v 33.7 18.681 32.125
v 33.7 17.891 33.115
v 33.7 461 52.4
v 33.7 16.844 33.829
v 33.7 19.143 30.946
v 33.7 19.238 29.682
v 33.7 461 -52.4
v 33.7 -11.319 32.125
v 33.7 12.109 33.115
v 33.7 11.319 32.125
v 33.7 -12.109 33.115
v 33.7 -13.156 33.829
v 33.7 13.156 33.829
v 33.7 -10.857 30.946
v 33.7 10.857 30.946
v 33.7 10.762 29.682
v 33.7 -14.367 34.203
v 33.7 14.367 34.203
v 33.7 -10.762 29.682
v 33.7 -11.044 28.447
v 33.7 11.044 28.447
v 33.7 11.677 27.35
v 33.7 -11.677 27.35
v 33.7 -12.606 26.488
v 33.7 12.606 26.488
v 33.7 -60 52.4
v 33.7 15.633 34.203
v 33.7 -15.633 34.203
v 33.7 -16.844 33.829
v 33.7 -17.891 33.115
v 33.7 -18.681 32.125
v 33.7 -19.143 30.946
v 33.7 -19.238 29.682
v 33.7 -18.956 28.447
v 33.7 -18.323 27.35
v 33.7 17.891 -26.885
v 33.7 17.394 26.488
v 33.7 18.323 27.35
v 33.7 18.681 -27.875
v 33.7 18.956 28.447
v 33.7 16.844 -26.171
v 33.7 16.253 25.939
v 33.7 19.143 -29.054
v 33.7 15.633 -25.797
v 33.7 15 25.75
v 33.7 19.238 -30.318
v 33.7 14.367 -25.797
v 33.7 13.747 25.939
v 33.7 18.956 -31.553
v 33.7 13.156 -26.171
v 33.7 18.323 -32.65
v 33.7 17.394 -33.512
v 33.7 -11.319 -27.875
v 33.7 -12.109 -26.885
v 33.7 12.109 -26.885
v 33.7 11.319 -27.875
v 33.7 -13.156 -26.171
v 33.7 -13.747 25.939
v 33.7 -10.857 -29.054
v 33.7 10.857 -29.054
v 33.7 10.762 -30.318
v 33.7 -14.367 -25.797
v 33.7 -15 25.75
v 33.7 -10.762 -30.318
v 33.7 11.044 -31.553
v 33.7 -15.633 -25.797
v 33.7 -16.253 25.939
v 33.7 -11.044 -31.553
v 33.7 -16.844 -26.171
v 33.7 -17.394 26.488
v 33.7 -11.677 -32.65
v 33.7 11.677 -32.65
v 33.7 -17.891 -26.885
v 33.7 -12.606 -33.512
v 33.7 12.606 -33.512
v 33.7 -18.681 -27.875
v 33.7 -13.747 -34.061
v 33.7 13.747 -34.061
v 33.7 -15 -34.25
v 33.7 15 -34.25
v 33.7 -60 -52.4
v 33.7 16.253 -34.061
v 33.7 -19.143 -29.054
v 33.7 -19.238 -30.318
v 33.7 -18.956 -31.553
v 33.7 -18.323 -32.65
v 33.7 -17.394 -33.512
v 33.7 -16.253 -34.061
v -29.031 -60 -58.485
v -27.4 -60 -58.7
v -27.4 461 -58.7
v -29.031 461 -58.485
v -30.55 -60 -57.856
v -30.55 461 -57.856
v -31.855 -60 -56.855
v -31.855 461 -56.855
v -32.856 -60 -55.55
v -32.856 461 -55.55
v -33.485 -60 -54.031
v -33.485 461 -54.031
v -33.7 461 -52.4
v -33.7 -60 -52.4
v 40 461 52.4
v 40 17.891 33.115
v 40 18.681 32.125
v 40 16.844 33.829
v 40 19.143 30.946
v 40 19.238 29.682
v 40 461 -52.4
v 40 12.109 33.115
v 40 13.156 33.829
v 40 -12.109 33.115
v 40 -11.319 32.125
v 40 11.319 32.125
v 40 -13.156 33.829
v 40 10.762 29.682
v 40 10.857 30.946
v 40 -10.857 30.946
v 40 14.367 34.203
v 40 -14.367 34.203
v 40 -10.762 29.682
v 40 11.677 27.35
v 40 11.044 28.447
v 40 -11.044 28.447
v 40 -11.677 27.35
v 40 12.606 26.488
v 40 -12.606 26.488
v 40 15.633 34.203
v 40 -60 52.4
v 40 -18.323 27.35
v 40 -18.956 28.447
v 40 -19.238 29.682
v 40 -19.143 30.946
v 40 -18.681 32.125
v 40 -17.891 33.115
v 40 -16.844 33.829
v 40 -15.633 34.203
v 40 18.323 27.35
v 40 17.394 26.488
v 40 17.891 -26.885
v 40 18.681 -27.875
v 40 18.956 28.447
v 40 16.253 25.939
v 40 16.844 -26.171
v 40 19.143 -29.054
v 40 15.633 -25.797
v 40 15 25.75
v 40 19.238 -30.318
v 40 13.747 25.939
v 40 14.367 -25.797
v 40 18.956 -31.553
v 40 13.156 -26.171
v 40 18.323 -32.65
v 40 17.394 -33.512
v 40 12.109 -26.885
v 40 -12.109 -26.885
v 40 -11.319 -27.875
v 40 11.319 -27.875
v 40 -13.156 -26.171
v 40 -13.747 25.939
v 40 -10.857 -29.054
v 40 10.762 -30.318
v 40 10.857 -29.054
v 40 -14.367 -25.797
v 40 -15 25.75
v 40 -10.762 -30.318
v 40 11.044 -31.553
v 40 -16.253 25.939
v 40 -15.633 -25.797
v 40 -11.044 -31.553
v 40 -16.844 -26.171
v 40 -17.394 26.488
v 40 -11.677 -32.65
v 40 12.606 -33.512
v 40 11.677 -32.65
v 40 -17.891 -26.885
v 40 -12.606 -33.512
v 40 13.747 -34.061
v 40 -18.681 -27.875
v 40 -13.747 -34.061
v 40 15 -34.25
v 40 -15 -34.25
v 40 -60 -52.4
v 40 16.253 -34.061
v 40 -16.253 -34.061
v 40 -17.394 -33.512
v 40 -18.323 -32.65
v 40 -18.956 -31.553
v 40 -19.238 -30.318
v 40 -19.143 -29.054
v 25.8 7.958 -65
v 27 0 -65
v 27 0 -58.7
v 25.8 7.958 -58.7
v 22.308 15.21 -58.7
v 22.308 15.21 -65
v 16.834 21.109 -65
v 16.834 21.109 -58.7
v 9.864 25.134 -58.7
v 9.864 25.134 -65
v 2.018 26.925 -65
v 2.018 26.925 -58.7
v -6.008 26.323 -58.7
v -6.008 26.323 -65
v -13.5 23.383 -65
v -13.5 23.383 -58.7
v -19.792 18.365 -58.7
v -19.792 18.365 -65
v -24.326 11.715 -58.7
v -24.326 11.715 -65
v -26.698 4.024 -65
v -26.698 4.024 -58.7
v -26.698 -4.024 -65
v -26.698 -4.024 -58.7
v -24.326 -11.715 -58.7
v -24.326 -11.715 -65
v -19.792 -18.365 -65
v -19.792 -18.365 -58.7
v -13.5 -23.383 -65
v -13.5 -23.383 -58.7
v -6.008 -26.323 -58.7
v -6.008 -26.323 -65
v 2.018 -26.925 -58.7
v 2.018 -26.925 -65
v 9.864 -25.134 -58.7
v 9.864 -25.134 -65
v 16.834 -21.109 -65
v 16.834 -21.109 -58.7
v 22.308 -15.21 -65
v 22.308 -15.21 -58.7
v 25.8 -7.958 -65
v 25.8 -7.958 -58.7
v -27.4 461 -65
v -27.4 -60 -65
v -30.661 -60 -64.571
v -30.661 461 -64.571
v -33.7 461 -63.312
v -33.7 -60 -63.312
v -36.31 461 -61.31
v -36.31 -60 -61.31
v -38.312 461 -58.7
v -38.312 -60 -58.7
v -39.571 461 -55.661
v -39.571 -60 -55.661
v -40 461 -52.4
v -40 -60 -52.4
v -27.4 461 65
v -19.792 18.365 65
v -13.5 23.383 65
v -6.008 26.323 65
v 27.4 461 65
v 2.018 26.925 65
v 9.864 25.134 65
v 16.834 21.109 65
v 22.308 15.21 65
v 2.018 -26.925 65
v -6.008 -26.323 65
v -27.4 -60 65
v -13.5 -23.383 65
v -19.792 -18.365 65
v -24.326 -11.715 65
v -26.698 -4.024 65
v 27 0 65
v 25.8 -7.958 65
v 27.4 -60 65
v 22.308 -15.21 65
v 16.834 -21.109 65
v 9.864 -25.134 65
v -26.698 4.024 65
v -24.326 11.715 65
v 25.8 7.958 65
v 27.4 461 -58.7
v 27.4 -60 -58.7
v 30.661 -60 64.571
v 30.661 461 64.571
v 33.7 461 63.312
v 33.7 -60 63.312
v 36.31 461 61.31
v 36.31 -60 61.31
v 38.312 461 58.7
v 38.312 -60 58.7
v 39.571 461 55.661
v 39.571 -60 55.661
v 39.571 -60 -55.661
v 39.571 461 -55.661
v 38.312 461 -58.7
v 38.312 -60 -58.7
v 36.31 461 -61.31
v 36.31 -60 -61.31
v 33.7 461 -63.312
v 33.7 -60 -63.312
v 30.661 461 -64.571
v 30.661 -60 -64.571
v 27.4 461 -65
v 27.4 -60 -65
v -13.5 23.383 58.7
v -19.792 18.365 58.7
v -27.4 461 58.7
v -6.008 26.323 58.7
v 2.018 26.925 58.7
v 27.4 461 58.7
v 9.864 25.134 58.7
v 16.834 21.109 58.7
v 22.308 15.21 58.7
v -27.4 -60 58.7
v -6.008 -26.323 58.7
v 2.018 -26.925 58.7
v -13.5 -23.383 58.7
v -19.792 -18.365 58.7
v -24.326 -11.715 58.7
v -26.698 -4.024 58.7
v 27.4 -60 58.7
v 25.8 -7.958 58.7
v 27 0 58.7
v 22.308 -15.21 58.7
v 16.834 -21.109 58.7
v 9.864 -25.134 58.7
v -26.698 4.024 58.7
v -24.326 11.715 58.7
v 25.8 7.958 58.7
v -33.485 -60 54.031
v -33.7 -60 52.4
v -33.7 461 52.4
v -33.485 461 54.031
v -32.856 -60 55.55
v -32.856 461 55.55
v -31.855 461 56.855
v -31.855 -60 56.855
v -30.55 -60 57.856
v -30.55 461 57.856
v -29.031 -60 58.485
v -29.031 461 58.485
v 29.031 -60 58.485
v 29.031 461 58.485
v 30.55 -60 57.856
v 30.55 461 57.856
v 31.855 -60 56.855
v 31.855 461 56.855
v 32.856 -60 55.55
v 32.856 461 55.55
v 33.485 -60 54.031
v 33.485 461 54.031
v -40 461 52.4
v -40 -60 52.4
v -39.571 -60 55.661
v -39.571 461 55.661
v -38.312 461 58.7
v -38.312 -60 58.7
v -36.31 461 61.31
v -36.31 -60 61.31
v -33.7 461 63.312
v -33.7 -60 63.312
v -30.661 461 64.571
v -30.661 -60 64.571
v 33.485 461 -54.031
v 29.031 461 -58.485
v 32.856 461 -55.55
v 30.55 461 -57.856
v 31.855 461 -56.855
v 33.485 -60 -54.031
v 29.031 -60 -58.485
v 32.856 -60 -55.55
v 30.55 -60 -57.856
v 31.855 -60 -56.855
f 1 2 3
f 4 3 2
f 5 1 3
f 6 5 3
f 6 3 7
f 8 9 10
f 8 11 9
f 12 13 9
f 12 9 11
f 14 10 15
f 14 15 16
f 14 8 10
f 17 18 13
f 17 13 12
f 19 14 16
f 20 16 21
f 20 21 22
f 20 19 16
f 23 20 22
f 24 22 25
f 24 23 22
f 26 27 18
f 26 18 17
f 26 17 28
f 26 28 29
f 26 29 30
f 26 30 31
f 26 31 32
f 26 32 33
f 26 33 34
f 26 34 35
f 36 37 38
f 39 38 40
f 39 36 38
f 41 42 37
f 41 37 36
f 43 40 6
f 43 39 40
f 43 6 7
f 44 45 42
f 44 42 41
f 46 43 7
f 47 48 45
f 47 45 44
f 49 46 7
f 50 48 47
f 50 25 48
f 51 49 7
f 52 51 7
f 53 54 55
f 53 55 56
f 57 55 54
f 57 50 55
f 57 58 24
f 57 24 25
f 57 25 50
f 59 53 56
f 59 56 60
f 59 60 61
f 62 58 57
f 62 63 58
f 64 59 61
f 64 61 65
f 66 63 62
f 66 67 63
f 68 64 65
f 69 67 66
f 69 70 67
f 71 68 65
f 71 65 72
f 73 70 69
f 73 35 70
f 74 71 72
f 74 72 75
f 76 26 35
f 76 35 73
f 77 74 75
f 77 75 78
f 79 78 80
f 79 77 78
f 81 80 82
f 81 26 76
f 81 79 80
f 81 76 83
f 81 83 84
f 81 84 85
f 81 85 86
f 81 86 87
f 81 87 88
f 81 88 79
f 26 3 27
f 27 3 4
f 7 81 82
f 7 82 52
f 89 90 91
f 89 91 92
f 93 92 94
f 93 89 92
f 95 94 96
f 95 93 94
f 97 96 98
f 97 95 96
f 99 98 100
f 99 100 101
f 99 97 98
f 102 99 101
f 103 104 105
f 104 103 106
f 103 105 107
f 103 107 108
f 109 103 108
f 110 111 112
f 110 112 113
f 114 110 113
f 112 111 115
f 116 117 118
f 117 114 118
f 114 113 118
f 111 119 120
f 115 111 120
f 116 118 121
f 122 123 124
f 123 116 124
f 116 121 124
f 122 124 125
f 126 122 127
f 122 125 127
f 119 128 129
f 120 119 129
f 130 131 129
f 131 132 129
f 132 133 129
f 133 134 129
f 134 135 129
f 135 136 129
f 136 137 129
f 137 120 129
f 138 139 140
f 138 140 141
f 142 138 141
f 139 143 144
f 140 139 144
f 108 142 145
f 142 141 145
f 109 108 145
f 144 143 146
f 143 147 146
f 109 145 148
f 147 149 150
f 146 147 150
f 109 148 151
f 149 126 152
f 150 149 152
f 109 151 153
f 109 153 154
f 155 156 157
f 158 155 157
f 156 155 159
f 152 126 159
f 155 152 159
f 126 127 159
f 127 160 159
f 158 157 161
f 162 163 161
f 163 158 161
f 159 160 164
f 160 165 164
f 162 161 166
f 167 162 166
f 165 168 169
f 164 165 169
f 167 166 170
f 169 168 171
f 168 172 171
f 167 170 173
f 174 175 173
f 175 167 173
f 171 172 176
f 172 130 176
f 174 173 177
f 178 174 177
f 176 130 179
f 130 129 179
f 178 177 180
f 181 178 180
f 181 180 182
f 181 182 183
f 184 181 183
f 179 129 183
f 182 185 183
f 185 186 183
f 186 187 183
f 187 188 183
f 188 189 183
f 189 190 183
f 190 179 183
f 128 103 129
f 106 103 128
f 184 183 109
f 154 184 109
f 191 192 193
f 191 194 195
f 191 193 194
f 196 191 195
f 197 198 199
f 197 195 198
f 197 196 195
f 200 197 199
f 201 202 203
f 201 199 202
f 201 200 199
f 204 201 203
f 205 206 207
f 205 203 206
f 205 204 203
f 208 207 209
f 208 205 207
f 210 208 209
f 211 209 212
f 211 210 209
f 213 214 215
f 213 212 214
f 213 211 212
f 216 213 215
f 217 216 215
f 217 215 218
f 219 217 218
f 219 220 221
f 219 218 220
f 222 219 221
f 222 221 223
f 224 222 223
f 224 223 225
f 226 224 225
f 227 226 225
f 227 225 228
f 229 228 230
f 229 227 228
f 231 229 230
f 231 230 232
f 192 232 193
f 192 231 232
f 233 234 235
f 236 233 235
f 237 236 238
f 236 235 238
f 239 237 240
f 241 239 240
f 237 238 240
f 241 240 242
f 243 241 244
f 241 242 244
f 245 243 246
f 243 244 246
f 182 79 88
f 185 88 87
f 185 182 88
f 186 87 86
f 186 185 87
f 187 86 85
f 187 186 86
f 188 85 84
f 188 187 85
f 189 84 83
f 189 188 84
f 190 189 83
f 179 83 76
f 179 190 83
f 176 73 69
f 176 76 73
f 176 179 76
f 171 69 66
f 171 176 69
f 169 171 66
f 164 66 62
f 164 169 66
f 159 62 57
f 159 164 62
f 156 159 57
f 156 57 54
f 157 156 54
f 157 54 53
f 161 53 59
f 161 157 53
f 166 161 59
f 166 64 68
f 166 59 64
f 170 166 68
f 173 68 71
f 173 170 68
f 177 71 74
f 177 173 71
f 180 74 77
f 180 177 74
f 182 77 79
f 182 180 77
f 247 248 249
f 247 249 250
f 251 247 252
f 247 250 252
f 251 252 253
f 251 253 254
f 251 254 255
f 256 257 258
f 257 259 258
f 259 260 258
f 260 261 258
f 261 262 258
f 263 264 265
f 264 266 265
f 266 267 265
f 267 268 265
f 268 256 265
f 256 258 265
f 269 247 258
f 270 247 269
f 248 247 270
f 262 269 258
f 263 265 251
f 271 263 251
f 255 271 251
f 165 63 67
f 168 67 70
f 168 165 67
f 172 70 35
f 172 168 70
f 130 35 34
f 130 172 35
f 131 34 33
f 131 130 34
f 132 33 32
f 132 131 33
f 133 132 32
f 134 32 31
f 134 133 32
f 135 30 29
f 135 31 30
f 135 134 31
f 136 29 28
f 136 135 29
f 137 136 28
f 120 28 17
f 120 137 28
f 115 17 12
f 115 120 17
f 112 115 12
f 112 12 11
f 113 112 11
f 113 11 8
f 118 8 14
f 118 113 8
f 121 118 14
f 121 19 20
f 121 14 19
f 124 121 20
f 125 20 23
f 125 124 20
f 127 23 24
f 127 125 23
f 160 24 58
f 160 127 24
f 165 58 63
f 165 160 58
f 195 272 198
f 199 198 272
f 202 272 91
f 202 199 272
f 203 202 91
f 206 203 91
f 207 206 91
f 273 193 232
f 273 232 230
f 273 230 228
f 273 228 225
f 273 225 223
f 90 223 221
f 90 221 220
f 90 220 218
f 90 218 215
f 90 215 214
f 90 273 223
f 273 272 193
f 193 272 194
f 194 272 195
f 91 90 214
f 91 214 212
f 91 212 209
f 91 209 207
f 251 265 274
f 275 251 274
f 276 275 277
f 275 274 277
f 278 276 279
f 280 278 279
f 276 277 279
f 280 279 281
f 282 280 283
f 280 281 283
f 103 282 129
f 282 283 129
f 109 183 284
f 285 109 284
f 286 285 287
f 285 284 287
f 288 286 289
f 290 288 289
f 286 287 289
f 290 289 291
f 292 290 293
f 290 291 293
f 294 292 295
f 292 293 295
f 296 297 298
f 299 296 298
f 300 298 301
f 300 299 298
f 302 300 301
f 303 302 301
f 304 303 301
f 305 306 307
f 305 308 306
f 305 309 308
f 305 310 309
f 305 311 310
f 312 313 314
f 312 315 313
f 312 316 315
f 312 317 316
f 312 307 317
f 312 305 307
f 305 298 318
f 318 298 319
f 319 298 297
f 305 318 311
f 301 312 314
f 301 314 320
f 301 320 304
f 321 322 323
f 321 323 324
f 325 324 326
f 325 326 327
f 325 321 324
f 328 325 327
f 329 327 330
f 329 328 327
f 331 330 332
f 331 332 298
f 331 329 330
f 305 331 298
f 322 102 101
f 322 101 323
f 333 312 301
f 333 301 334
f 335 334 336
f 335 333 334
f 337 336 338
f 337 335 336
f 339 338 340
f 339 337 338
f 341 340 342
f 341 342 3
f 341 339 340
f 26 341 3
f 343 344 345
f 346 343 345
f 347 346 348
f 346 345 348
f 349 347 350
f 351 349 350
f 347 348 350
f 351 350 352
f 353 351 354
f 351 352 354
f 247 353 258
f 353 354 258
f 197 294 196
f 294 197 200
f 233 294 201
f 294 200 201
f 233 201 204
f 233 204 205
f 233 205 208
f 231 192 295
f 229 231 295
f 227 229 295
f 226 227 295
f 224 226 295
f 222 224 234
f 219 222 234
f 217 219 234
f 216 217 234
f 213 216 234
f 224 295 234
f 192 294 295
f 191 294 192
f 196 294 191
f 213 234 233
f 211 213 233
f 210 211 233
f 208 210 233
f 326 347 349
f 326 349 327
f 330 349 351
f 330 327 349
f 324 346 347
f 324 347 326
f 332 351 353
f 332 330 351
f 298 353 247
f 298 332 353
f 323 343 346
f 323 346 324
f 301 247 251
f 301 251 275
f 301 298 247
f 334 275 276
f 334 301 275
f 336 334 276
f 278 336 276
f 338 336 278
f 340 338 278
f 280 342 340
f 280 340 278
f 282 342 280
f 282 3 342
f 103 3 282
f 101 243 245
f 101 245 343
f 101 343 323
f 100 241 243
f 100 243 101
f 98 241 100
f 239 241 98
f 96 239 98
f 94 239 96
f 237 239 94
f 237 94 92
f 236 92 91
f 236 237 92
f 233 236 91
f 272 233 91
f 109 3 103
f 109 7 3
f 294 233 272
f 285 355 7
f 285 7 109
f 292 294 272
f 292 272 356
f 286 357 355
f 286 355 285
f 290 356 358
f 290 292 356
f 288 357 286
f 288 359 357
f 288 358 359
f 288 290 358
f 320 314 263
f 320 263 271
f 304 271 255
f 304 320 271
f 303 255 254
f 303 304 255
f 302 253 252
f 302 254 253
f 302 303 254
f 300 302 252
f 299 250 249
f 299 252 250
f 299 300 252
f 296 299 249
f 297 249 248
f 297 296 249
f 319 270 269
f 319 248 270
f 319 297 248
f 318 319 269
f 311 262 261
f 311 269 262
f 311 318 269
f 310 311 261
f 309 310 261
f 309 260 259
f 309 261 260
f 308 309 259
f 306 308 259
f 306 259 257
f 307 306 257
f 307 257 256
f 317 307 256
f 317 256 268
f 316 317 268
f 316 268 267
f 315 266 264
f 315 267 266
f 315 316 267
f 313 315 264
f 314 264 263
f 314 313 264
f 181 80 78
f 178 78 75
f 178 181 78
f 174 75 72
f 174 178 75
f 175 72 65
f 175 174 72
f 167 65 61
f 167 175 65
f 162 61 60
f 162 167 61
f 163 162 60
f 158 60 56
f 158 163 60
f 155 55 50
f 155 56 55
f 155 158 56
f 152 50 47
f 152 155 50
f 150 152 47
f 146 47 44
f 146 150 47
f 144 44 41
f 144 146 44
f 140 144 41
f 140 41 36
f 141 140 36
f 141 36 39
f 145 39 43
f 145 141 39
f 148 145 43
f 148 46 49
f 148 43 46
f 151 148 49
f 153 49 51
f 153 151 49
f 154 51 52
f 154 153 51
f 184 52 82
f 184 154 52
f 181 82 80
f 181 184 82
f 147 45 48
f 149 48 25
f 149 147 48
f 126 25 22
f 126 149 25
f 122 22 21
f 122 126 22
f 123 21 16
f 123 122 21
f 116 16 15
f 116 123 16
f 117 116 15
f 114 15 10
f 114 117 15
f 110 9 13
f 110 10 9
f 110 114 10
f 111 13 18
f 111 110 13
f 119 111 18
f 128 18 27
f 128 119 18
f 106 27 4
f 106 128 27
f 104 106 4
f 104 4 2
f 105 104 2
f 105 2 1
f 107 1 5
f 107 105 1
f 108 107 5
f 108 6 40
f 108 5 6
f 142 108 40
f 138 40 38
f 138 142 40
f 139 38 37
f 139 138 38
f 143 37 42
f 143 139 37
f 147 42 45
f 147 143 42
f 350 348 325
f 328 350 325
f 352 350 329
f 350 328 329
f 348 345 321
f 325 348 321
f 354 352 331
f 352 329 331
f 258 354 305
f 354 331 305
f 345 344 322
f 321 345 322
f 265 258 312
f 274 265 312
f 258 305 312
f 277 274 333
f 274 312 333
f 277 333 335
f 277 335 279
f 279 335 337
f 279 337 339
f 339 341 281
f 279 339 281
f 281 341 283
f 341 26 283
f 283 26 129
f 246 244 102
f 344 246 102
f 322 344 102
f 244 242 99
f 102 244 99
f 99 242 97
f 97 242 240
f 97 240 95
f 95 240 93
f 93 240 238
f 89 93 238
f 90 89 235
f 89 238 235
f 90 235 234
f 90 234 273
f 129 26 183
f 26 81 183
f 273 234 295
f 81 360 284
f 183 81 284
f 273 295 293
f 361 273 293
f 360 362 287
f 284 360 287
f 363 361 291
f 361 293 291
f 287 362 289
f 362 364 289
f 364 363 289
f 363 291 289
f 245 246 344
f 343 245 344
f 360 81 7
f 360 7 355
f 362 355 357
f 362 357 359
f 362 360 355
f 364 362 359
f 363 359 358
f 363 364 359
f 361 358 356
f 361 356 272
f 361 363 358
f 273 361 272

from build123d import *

# Parameters (mm, degrees)
AUFSATZ_LINEAR_AUSTRAGEN1_DEPTH      = 461
AUFSATZ_LINEAR_AUSTRAGEN1_DEPTH_BACK = 60
SCHNITT_LINEAR_AUSTRAGEN1_DEPTH      = 468.275079584
SCHNITT_LINEAR_AUSTRAGEN1_DEPTH_BACK = 468.275079584
SKIZZE3_R                            = 27
LINEARES_MUSTER2_COUNT               = 2
LINEARES_MUSTER2_PITCH               = 60
LINEARES_MUSTER2_COUNT_DIR2          = 2
LINEARES_MUSTER2_PITCH_DIR2          = 30


with BuildPart() as part:
    # Skizze1 → Aufsatz-Linear austragen1 (new, two sides: drawn at the far end of the back side and taken through both)
    with BuildSketch(Plane(origin=(0, 0, 0), x_dir=(1, 0, 0), z_dir=(0, 1, 0)).offset(-AUFSATZ_LINEAR_AUSTRAGEN1_DEPTH_BACK)):
        with BuildLine():
            Line((-27.4, -65), (27.4, -65))
            ThreePointArc((27.4, -65), (36.309545443, -61.309545443), (40, -52.4))
            Line((40, -52.4), (40, 52.4))
            ThreePointArc((40, 52.4), (36.309545443, 61.309545443), (27.4, 65))
            Line((27.4, 65), (-27.4, 65))
            ThreePointArc((-27.4, 65), (-36.309545443, 61.309545443), (-40, 52.4))
            Line((-40, 52.4), (-40, -52.4))
            ThreePointArc((-40, -52.4), (-36.309545443, -61.309545443), (-27.4, -65))
        make_face()
        with BuildLine():
            Line((-27.4, -58.7), (27.4, -58.7))
            ThreePointArc((27.4, -58.7), (31.854772721, -56.854772721), (33.7, -52.4))
            Line((33.7, -52.4), (33.7, 52.4))
            ThreePointArc((33.7, 52.4), (31.854772721, 56.854772721), (27.4, 58.7))
            Line((27.4, 58.7), (-27.4, 58.7))
            ThreePointArc((-27.4, 58.7), (-31.854772721, 56.854772721), (-33.7, 52.4))
            Line((-33.7, 52.4), (-33.7, -52.4))
            ThreePointArc((-33.7, -52.4), (-31.854772721, -56.854772721), (-27.4, -58.7))
        make_face(mode=Mode.SUBTRACT)
    extrude(amount=AUFSATZ_LINEAR_AUSTRAGEN1_DEPTH + AUFSATZ_LINEAR_AUSTRAGEN1_DEPTH_BACK)

    # Skizze3 → Schnitt-Linear austragen1 (cut, two sides: drawn at the far end of the back side and taken through both)
    with BuildSketch(Plane.XY.offset(-SCHNITT_LINEAR_AUSTRAGEN1_DEPTH_BACK)):
        Circle(SKIZZE3_R)
    extrude(amount=SCHNITT_LINEAR_AUSTRAGEN1_DEPTH + SCHNITT_LINEAR_AUSTRAGEN1_DEPTH_BACK, mode=Mode.SUBTRACT)

    # Skizze7 → M10 Gewindebohrung2 (revolve, cut)
    with BuildSketch(Plane(origin=(40, -15, 30), x_dir=(0, 0, -1), z_dir=(0, 1, 0))):
        Polygon((0, 0), (0, 30.053657631), (4.25, 27.5), (4.25, 0), align=None)
    m10_gewindebohrung2 = revolve(axis=Axis((46.35, -15, 30), (-1, 0, 0)), mode=Mode.SUBTRACT)

    # Lineares Muster2: M10 Gewindebohrung2 2 × 2
    with Locations(*[(0, j * LINEARES_MUSTER2_PITCH_DIR2, -i * LINEARES_MUSTER2_PITCH) for i in range(LINEARES_MUSTER2_COUNT) for j in range(LINEARES_MUSTER2_COUNT_DIR2) if (i, j) != (0, 0)]):
        add(m10_gewindebohrung2, mode=Mode.SUBTRACT)


solid = part.part
